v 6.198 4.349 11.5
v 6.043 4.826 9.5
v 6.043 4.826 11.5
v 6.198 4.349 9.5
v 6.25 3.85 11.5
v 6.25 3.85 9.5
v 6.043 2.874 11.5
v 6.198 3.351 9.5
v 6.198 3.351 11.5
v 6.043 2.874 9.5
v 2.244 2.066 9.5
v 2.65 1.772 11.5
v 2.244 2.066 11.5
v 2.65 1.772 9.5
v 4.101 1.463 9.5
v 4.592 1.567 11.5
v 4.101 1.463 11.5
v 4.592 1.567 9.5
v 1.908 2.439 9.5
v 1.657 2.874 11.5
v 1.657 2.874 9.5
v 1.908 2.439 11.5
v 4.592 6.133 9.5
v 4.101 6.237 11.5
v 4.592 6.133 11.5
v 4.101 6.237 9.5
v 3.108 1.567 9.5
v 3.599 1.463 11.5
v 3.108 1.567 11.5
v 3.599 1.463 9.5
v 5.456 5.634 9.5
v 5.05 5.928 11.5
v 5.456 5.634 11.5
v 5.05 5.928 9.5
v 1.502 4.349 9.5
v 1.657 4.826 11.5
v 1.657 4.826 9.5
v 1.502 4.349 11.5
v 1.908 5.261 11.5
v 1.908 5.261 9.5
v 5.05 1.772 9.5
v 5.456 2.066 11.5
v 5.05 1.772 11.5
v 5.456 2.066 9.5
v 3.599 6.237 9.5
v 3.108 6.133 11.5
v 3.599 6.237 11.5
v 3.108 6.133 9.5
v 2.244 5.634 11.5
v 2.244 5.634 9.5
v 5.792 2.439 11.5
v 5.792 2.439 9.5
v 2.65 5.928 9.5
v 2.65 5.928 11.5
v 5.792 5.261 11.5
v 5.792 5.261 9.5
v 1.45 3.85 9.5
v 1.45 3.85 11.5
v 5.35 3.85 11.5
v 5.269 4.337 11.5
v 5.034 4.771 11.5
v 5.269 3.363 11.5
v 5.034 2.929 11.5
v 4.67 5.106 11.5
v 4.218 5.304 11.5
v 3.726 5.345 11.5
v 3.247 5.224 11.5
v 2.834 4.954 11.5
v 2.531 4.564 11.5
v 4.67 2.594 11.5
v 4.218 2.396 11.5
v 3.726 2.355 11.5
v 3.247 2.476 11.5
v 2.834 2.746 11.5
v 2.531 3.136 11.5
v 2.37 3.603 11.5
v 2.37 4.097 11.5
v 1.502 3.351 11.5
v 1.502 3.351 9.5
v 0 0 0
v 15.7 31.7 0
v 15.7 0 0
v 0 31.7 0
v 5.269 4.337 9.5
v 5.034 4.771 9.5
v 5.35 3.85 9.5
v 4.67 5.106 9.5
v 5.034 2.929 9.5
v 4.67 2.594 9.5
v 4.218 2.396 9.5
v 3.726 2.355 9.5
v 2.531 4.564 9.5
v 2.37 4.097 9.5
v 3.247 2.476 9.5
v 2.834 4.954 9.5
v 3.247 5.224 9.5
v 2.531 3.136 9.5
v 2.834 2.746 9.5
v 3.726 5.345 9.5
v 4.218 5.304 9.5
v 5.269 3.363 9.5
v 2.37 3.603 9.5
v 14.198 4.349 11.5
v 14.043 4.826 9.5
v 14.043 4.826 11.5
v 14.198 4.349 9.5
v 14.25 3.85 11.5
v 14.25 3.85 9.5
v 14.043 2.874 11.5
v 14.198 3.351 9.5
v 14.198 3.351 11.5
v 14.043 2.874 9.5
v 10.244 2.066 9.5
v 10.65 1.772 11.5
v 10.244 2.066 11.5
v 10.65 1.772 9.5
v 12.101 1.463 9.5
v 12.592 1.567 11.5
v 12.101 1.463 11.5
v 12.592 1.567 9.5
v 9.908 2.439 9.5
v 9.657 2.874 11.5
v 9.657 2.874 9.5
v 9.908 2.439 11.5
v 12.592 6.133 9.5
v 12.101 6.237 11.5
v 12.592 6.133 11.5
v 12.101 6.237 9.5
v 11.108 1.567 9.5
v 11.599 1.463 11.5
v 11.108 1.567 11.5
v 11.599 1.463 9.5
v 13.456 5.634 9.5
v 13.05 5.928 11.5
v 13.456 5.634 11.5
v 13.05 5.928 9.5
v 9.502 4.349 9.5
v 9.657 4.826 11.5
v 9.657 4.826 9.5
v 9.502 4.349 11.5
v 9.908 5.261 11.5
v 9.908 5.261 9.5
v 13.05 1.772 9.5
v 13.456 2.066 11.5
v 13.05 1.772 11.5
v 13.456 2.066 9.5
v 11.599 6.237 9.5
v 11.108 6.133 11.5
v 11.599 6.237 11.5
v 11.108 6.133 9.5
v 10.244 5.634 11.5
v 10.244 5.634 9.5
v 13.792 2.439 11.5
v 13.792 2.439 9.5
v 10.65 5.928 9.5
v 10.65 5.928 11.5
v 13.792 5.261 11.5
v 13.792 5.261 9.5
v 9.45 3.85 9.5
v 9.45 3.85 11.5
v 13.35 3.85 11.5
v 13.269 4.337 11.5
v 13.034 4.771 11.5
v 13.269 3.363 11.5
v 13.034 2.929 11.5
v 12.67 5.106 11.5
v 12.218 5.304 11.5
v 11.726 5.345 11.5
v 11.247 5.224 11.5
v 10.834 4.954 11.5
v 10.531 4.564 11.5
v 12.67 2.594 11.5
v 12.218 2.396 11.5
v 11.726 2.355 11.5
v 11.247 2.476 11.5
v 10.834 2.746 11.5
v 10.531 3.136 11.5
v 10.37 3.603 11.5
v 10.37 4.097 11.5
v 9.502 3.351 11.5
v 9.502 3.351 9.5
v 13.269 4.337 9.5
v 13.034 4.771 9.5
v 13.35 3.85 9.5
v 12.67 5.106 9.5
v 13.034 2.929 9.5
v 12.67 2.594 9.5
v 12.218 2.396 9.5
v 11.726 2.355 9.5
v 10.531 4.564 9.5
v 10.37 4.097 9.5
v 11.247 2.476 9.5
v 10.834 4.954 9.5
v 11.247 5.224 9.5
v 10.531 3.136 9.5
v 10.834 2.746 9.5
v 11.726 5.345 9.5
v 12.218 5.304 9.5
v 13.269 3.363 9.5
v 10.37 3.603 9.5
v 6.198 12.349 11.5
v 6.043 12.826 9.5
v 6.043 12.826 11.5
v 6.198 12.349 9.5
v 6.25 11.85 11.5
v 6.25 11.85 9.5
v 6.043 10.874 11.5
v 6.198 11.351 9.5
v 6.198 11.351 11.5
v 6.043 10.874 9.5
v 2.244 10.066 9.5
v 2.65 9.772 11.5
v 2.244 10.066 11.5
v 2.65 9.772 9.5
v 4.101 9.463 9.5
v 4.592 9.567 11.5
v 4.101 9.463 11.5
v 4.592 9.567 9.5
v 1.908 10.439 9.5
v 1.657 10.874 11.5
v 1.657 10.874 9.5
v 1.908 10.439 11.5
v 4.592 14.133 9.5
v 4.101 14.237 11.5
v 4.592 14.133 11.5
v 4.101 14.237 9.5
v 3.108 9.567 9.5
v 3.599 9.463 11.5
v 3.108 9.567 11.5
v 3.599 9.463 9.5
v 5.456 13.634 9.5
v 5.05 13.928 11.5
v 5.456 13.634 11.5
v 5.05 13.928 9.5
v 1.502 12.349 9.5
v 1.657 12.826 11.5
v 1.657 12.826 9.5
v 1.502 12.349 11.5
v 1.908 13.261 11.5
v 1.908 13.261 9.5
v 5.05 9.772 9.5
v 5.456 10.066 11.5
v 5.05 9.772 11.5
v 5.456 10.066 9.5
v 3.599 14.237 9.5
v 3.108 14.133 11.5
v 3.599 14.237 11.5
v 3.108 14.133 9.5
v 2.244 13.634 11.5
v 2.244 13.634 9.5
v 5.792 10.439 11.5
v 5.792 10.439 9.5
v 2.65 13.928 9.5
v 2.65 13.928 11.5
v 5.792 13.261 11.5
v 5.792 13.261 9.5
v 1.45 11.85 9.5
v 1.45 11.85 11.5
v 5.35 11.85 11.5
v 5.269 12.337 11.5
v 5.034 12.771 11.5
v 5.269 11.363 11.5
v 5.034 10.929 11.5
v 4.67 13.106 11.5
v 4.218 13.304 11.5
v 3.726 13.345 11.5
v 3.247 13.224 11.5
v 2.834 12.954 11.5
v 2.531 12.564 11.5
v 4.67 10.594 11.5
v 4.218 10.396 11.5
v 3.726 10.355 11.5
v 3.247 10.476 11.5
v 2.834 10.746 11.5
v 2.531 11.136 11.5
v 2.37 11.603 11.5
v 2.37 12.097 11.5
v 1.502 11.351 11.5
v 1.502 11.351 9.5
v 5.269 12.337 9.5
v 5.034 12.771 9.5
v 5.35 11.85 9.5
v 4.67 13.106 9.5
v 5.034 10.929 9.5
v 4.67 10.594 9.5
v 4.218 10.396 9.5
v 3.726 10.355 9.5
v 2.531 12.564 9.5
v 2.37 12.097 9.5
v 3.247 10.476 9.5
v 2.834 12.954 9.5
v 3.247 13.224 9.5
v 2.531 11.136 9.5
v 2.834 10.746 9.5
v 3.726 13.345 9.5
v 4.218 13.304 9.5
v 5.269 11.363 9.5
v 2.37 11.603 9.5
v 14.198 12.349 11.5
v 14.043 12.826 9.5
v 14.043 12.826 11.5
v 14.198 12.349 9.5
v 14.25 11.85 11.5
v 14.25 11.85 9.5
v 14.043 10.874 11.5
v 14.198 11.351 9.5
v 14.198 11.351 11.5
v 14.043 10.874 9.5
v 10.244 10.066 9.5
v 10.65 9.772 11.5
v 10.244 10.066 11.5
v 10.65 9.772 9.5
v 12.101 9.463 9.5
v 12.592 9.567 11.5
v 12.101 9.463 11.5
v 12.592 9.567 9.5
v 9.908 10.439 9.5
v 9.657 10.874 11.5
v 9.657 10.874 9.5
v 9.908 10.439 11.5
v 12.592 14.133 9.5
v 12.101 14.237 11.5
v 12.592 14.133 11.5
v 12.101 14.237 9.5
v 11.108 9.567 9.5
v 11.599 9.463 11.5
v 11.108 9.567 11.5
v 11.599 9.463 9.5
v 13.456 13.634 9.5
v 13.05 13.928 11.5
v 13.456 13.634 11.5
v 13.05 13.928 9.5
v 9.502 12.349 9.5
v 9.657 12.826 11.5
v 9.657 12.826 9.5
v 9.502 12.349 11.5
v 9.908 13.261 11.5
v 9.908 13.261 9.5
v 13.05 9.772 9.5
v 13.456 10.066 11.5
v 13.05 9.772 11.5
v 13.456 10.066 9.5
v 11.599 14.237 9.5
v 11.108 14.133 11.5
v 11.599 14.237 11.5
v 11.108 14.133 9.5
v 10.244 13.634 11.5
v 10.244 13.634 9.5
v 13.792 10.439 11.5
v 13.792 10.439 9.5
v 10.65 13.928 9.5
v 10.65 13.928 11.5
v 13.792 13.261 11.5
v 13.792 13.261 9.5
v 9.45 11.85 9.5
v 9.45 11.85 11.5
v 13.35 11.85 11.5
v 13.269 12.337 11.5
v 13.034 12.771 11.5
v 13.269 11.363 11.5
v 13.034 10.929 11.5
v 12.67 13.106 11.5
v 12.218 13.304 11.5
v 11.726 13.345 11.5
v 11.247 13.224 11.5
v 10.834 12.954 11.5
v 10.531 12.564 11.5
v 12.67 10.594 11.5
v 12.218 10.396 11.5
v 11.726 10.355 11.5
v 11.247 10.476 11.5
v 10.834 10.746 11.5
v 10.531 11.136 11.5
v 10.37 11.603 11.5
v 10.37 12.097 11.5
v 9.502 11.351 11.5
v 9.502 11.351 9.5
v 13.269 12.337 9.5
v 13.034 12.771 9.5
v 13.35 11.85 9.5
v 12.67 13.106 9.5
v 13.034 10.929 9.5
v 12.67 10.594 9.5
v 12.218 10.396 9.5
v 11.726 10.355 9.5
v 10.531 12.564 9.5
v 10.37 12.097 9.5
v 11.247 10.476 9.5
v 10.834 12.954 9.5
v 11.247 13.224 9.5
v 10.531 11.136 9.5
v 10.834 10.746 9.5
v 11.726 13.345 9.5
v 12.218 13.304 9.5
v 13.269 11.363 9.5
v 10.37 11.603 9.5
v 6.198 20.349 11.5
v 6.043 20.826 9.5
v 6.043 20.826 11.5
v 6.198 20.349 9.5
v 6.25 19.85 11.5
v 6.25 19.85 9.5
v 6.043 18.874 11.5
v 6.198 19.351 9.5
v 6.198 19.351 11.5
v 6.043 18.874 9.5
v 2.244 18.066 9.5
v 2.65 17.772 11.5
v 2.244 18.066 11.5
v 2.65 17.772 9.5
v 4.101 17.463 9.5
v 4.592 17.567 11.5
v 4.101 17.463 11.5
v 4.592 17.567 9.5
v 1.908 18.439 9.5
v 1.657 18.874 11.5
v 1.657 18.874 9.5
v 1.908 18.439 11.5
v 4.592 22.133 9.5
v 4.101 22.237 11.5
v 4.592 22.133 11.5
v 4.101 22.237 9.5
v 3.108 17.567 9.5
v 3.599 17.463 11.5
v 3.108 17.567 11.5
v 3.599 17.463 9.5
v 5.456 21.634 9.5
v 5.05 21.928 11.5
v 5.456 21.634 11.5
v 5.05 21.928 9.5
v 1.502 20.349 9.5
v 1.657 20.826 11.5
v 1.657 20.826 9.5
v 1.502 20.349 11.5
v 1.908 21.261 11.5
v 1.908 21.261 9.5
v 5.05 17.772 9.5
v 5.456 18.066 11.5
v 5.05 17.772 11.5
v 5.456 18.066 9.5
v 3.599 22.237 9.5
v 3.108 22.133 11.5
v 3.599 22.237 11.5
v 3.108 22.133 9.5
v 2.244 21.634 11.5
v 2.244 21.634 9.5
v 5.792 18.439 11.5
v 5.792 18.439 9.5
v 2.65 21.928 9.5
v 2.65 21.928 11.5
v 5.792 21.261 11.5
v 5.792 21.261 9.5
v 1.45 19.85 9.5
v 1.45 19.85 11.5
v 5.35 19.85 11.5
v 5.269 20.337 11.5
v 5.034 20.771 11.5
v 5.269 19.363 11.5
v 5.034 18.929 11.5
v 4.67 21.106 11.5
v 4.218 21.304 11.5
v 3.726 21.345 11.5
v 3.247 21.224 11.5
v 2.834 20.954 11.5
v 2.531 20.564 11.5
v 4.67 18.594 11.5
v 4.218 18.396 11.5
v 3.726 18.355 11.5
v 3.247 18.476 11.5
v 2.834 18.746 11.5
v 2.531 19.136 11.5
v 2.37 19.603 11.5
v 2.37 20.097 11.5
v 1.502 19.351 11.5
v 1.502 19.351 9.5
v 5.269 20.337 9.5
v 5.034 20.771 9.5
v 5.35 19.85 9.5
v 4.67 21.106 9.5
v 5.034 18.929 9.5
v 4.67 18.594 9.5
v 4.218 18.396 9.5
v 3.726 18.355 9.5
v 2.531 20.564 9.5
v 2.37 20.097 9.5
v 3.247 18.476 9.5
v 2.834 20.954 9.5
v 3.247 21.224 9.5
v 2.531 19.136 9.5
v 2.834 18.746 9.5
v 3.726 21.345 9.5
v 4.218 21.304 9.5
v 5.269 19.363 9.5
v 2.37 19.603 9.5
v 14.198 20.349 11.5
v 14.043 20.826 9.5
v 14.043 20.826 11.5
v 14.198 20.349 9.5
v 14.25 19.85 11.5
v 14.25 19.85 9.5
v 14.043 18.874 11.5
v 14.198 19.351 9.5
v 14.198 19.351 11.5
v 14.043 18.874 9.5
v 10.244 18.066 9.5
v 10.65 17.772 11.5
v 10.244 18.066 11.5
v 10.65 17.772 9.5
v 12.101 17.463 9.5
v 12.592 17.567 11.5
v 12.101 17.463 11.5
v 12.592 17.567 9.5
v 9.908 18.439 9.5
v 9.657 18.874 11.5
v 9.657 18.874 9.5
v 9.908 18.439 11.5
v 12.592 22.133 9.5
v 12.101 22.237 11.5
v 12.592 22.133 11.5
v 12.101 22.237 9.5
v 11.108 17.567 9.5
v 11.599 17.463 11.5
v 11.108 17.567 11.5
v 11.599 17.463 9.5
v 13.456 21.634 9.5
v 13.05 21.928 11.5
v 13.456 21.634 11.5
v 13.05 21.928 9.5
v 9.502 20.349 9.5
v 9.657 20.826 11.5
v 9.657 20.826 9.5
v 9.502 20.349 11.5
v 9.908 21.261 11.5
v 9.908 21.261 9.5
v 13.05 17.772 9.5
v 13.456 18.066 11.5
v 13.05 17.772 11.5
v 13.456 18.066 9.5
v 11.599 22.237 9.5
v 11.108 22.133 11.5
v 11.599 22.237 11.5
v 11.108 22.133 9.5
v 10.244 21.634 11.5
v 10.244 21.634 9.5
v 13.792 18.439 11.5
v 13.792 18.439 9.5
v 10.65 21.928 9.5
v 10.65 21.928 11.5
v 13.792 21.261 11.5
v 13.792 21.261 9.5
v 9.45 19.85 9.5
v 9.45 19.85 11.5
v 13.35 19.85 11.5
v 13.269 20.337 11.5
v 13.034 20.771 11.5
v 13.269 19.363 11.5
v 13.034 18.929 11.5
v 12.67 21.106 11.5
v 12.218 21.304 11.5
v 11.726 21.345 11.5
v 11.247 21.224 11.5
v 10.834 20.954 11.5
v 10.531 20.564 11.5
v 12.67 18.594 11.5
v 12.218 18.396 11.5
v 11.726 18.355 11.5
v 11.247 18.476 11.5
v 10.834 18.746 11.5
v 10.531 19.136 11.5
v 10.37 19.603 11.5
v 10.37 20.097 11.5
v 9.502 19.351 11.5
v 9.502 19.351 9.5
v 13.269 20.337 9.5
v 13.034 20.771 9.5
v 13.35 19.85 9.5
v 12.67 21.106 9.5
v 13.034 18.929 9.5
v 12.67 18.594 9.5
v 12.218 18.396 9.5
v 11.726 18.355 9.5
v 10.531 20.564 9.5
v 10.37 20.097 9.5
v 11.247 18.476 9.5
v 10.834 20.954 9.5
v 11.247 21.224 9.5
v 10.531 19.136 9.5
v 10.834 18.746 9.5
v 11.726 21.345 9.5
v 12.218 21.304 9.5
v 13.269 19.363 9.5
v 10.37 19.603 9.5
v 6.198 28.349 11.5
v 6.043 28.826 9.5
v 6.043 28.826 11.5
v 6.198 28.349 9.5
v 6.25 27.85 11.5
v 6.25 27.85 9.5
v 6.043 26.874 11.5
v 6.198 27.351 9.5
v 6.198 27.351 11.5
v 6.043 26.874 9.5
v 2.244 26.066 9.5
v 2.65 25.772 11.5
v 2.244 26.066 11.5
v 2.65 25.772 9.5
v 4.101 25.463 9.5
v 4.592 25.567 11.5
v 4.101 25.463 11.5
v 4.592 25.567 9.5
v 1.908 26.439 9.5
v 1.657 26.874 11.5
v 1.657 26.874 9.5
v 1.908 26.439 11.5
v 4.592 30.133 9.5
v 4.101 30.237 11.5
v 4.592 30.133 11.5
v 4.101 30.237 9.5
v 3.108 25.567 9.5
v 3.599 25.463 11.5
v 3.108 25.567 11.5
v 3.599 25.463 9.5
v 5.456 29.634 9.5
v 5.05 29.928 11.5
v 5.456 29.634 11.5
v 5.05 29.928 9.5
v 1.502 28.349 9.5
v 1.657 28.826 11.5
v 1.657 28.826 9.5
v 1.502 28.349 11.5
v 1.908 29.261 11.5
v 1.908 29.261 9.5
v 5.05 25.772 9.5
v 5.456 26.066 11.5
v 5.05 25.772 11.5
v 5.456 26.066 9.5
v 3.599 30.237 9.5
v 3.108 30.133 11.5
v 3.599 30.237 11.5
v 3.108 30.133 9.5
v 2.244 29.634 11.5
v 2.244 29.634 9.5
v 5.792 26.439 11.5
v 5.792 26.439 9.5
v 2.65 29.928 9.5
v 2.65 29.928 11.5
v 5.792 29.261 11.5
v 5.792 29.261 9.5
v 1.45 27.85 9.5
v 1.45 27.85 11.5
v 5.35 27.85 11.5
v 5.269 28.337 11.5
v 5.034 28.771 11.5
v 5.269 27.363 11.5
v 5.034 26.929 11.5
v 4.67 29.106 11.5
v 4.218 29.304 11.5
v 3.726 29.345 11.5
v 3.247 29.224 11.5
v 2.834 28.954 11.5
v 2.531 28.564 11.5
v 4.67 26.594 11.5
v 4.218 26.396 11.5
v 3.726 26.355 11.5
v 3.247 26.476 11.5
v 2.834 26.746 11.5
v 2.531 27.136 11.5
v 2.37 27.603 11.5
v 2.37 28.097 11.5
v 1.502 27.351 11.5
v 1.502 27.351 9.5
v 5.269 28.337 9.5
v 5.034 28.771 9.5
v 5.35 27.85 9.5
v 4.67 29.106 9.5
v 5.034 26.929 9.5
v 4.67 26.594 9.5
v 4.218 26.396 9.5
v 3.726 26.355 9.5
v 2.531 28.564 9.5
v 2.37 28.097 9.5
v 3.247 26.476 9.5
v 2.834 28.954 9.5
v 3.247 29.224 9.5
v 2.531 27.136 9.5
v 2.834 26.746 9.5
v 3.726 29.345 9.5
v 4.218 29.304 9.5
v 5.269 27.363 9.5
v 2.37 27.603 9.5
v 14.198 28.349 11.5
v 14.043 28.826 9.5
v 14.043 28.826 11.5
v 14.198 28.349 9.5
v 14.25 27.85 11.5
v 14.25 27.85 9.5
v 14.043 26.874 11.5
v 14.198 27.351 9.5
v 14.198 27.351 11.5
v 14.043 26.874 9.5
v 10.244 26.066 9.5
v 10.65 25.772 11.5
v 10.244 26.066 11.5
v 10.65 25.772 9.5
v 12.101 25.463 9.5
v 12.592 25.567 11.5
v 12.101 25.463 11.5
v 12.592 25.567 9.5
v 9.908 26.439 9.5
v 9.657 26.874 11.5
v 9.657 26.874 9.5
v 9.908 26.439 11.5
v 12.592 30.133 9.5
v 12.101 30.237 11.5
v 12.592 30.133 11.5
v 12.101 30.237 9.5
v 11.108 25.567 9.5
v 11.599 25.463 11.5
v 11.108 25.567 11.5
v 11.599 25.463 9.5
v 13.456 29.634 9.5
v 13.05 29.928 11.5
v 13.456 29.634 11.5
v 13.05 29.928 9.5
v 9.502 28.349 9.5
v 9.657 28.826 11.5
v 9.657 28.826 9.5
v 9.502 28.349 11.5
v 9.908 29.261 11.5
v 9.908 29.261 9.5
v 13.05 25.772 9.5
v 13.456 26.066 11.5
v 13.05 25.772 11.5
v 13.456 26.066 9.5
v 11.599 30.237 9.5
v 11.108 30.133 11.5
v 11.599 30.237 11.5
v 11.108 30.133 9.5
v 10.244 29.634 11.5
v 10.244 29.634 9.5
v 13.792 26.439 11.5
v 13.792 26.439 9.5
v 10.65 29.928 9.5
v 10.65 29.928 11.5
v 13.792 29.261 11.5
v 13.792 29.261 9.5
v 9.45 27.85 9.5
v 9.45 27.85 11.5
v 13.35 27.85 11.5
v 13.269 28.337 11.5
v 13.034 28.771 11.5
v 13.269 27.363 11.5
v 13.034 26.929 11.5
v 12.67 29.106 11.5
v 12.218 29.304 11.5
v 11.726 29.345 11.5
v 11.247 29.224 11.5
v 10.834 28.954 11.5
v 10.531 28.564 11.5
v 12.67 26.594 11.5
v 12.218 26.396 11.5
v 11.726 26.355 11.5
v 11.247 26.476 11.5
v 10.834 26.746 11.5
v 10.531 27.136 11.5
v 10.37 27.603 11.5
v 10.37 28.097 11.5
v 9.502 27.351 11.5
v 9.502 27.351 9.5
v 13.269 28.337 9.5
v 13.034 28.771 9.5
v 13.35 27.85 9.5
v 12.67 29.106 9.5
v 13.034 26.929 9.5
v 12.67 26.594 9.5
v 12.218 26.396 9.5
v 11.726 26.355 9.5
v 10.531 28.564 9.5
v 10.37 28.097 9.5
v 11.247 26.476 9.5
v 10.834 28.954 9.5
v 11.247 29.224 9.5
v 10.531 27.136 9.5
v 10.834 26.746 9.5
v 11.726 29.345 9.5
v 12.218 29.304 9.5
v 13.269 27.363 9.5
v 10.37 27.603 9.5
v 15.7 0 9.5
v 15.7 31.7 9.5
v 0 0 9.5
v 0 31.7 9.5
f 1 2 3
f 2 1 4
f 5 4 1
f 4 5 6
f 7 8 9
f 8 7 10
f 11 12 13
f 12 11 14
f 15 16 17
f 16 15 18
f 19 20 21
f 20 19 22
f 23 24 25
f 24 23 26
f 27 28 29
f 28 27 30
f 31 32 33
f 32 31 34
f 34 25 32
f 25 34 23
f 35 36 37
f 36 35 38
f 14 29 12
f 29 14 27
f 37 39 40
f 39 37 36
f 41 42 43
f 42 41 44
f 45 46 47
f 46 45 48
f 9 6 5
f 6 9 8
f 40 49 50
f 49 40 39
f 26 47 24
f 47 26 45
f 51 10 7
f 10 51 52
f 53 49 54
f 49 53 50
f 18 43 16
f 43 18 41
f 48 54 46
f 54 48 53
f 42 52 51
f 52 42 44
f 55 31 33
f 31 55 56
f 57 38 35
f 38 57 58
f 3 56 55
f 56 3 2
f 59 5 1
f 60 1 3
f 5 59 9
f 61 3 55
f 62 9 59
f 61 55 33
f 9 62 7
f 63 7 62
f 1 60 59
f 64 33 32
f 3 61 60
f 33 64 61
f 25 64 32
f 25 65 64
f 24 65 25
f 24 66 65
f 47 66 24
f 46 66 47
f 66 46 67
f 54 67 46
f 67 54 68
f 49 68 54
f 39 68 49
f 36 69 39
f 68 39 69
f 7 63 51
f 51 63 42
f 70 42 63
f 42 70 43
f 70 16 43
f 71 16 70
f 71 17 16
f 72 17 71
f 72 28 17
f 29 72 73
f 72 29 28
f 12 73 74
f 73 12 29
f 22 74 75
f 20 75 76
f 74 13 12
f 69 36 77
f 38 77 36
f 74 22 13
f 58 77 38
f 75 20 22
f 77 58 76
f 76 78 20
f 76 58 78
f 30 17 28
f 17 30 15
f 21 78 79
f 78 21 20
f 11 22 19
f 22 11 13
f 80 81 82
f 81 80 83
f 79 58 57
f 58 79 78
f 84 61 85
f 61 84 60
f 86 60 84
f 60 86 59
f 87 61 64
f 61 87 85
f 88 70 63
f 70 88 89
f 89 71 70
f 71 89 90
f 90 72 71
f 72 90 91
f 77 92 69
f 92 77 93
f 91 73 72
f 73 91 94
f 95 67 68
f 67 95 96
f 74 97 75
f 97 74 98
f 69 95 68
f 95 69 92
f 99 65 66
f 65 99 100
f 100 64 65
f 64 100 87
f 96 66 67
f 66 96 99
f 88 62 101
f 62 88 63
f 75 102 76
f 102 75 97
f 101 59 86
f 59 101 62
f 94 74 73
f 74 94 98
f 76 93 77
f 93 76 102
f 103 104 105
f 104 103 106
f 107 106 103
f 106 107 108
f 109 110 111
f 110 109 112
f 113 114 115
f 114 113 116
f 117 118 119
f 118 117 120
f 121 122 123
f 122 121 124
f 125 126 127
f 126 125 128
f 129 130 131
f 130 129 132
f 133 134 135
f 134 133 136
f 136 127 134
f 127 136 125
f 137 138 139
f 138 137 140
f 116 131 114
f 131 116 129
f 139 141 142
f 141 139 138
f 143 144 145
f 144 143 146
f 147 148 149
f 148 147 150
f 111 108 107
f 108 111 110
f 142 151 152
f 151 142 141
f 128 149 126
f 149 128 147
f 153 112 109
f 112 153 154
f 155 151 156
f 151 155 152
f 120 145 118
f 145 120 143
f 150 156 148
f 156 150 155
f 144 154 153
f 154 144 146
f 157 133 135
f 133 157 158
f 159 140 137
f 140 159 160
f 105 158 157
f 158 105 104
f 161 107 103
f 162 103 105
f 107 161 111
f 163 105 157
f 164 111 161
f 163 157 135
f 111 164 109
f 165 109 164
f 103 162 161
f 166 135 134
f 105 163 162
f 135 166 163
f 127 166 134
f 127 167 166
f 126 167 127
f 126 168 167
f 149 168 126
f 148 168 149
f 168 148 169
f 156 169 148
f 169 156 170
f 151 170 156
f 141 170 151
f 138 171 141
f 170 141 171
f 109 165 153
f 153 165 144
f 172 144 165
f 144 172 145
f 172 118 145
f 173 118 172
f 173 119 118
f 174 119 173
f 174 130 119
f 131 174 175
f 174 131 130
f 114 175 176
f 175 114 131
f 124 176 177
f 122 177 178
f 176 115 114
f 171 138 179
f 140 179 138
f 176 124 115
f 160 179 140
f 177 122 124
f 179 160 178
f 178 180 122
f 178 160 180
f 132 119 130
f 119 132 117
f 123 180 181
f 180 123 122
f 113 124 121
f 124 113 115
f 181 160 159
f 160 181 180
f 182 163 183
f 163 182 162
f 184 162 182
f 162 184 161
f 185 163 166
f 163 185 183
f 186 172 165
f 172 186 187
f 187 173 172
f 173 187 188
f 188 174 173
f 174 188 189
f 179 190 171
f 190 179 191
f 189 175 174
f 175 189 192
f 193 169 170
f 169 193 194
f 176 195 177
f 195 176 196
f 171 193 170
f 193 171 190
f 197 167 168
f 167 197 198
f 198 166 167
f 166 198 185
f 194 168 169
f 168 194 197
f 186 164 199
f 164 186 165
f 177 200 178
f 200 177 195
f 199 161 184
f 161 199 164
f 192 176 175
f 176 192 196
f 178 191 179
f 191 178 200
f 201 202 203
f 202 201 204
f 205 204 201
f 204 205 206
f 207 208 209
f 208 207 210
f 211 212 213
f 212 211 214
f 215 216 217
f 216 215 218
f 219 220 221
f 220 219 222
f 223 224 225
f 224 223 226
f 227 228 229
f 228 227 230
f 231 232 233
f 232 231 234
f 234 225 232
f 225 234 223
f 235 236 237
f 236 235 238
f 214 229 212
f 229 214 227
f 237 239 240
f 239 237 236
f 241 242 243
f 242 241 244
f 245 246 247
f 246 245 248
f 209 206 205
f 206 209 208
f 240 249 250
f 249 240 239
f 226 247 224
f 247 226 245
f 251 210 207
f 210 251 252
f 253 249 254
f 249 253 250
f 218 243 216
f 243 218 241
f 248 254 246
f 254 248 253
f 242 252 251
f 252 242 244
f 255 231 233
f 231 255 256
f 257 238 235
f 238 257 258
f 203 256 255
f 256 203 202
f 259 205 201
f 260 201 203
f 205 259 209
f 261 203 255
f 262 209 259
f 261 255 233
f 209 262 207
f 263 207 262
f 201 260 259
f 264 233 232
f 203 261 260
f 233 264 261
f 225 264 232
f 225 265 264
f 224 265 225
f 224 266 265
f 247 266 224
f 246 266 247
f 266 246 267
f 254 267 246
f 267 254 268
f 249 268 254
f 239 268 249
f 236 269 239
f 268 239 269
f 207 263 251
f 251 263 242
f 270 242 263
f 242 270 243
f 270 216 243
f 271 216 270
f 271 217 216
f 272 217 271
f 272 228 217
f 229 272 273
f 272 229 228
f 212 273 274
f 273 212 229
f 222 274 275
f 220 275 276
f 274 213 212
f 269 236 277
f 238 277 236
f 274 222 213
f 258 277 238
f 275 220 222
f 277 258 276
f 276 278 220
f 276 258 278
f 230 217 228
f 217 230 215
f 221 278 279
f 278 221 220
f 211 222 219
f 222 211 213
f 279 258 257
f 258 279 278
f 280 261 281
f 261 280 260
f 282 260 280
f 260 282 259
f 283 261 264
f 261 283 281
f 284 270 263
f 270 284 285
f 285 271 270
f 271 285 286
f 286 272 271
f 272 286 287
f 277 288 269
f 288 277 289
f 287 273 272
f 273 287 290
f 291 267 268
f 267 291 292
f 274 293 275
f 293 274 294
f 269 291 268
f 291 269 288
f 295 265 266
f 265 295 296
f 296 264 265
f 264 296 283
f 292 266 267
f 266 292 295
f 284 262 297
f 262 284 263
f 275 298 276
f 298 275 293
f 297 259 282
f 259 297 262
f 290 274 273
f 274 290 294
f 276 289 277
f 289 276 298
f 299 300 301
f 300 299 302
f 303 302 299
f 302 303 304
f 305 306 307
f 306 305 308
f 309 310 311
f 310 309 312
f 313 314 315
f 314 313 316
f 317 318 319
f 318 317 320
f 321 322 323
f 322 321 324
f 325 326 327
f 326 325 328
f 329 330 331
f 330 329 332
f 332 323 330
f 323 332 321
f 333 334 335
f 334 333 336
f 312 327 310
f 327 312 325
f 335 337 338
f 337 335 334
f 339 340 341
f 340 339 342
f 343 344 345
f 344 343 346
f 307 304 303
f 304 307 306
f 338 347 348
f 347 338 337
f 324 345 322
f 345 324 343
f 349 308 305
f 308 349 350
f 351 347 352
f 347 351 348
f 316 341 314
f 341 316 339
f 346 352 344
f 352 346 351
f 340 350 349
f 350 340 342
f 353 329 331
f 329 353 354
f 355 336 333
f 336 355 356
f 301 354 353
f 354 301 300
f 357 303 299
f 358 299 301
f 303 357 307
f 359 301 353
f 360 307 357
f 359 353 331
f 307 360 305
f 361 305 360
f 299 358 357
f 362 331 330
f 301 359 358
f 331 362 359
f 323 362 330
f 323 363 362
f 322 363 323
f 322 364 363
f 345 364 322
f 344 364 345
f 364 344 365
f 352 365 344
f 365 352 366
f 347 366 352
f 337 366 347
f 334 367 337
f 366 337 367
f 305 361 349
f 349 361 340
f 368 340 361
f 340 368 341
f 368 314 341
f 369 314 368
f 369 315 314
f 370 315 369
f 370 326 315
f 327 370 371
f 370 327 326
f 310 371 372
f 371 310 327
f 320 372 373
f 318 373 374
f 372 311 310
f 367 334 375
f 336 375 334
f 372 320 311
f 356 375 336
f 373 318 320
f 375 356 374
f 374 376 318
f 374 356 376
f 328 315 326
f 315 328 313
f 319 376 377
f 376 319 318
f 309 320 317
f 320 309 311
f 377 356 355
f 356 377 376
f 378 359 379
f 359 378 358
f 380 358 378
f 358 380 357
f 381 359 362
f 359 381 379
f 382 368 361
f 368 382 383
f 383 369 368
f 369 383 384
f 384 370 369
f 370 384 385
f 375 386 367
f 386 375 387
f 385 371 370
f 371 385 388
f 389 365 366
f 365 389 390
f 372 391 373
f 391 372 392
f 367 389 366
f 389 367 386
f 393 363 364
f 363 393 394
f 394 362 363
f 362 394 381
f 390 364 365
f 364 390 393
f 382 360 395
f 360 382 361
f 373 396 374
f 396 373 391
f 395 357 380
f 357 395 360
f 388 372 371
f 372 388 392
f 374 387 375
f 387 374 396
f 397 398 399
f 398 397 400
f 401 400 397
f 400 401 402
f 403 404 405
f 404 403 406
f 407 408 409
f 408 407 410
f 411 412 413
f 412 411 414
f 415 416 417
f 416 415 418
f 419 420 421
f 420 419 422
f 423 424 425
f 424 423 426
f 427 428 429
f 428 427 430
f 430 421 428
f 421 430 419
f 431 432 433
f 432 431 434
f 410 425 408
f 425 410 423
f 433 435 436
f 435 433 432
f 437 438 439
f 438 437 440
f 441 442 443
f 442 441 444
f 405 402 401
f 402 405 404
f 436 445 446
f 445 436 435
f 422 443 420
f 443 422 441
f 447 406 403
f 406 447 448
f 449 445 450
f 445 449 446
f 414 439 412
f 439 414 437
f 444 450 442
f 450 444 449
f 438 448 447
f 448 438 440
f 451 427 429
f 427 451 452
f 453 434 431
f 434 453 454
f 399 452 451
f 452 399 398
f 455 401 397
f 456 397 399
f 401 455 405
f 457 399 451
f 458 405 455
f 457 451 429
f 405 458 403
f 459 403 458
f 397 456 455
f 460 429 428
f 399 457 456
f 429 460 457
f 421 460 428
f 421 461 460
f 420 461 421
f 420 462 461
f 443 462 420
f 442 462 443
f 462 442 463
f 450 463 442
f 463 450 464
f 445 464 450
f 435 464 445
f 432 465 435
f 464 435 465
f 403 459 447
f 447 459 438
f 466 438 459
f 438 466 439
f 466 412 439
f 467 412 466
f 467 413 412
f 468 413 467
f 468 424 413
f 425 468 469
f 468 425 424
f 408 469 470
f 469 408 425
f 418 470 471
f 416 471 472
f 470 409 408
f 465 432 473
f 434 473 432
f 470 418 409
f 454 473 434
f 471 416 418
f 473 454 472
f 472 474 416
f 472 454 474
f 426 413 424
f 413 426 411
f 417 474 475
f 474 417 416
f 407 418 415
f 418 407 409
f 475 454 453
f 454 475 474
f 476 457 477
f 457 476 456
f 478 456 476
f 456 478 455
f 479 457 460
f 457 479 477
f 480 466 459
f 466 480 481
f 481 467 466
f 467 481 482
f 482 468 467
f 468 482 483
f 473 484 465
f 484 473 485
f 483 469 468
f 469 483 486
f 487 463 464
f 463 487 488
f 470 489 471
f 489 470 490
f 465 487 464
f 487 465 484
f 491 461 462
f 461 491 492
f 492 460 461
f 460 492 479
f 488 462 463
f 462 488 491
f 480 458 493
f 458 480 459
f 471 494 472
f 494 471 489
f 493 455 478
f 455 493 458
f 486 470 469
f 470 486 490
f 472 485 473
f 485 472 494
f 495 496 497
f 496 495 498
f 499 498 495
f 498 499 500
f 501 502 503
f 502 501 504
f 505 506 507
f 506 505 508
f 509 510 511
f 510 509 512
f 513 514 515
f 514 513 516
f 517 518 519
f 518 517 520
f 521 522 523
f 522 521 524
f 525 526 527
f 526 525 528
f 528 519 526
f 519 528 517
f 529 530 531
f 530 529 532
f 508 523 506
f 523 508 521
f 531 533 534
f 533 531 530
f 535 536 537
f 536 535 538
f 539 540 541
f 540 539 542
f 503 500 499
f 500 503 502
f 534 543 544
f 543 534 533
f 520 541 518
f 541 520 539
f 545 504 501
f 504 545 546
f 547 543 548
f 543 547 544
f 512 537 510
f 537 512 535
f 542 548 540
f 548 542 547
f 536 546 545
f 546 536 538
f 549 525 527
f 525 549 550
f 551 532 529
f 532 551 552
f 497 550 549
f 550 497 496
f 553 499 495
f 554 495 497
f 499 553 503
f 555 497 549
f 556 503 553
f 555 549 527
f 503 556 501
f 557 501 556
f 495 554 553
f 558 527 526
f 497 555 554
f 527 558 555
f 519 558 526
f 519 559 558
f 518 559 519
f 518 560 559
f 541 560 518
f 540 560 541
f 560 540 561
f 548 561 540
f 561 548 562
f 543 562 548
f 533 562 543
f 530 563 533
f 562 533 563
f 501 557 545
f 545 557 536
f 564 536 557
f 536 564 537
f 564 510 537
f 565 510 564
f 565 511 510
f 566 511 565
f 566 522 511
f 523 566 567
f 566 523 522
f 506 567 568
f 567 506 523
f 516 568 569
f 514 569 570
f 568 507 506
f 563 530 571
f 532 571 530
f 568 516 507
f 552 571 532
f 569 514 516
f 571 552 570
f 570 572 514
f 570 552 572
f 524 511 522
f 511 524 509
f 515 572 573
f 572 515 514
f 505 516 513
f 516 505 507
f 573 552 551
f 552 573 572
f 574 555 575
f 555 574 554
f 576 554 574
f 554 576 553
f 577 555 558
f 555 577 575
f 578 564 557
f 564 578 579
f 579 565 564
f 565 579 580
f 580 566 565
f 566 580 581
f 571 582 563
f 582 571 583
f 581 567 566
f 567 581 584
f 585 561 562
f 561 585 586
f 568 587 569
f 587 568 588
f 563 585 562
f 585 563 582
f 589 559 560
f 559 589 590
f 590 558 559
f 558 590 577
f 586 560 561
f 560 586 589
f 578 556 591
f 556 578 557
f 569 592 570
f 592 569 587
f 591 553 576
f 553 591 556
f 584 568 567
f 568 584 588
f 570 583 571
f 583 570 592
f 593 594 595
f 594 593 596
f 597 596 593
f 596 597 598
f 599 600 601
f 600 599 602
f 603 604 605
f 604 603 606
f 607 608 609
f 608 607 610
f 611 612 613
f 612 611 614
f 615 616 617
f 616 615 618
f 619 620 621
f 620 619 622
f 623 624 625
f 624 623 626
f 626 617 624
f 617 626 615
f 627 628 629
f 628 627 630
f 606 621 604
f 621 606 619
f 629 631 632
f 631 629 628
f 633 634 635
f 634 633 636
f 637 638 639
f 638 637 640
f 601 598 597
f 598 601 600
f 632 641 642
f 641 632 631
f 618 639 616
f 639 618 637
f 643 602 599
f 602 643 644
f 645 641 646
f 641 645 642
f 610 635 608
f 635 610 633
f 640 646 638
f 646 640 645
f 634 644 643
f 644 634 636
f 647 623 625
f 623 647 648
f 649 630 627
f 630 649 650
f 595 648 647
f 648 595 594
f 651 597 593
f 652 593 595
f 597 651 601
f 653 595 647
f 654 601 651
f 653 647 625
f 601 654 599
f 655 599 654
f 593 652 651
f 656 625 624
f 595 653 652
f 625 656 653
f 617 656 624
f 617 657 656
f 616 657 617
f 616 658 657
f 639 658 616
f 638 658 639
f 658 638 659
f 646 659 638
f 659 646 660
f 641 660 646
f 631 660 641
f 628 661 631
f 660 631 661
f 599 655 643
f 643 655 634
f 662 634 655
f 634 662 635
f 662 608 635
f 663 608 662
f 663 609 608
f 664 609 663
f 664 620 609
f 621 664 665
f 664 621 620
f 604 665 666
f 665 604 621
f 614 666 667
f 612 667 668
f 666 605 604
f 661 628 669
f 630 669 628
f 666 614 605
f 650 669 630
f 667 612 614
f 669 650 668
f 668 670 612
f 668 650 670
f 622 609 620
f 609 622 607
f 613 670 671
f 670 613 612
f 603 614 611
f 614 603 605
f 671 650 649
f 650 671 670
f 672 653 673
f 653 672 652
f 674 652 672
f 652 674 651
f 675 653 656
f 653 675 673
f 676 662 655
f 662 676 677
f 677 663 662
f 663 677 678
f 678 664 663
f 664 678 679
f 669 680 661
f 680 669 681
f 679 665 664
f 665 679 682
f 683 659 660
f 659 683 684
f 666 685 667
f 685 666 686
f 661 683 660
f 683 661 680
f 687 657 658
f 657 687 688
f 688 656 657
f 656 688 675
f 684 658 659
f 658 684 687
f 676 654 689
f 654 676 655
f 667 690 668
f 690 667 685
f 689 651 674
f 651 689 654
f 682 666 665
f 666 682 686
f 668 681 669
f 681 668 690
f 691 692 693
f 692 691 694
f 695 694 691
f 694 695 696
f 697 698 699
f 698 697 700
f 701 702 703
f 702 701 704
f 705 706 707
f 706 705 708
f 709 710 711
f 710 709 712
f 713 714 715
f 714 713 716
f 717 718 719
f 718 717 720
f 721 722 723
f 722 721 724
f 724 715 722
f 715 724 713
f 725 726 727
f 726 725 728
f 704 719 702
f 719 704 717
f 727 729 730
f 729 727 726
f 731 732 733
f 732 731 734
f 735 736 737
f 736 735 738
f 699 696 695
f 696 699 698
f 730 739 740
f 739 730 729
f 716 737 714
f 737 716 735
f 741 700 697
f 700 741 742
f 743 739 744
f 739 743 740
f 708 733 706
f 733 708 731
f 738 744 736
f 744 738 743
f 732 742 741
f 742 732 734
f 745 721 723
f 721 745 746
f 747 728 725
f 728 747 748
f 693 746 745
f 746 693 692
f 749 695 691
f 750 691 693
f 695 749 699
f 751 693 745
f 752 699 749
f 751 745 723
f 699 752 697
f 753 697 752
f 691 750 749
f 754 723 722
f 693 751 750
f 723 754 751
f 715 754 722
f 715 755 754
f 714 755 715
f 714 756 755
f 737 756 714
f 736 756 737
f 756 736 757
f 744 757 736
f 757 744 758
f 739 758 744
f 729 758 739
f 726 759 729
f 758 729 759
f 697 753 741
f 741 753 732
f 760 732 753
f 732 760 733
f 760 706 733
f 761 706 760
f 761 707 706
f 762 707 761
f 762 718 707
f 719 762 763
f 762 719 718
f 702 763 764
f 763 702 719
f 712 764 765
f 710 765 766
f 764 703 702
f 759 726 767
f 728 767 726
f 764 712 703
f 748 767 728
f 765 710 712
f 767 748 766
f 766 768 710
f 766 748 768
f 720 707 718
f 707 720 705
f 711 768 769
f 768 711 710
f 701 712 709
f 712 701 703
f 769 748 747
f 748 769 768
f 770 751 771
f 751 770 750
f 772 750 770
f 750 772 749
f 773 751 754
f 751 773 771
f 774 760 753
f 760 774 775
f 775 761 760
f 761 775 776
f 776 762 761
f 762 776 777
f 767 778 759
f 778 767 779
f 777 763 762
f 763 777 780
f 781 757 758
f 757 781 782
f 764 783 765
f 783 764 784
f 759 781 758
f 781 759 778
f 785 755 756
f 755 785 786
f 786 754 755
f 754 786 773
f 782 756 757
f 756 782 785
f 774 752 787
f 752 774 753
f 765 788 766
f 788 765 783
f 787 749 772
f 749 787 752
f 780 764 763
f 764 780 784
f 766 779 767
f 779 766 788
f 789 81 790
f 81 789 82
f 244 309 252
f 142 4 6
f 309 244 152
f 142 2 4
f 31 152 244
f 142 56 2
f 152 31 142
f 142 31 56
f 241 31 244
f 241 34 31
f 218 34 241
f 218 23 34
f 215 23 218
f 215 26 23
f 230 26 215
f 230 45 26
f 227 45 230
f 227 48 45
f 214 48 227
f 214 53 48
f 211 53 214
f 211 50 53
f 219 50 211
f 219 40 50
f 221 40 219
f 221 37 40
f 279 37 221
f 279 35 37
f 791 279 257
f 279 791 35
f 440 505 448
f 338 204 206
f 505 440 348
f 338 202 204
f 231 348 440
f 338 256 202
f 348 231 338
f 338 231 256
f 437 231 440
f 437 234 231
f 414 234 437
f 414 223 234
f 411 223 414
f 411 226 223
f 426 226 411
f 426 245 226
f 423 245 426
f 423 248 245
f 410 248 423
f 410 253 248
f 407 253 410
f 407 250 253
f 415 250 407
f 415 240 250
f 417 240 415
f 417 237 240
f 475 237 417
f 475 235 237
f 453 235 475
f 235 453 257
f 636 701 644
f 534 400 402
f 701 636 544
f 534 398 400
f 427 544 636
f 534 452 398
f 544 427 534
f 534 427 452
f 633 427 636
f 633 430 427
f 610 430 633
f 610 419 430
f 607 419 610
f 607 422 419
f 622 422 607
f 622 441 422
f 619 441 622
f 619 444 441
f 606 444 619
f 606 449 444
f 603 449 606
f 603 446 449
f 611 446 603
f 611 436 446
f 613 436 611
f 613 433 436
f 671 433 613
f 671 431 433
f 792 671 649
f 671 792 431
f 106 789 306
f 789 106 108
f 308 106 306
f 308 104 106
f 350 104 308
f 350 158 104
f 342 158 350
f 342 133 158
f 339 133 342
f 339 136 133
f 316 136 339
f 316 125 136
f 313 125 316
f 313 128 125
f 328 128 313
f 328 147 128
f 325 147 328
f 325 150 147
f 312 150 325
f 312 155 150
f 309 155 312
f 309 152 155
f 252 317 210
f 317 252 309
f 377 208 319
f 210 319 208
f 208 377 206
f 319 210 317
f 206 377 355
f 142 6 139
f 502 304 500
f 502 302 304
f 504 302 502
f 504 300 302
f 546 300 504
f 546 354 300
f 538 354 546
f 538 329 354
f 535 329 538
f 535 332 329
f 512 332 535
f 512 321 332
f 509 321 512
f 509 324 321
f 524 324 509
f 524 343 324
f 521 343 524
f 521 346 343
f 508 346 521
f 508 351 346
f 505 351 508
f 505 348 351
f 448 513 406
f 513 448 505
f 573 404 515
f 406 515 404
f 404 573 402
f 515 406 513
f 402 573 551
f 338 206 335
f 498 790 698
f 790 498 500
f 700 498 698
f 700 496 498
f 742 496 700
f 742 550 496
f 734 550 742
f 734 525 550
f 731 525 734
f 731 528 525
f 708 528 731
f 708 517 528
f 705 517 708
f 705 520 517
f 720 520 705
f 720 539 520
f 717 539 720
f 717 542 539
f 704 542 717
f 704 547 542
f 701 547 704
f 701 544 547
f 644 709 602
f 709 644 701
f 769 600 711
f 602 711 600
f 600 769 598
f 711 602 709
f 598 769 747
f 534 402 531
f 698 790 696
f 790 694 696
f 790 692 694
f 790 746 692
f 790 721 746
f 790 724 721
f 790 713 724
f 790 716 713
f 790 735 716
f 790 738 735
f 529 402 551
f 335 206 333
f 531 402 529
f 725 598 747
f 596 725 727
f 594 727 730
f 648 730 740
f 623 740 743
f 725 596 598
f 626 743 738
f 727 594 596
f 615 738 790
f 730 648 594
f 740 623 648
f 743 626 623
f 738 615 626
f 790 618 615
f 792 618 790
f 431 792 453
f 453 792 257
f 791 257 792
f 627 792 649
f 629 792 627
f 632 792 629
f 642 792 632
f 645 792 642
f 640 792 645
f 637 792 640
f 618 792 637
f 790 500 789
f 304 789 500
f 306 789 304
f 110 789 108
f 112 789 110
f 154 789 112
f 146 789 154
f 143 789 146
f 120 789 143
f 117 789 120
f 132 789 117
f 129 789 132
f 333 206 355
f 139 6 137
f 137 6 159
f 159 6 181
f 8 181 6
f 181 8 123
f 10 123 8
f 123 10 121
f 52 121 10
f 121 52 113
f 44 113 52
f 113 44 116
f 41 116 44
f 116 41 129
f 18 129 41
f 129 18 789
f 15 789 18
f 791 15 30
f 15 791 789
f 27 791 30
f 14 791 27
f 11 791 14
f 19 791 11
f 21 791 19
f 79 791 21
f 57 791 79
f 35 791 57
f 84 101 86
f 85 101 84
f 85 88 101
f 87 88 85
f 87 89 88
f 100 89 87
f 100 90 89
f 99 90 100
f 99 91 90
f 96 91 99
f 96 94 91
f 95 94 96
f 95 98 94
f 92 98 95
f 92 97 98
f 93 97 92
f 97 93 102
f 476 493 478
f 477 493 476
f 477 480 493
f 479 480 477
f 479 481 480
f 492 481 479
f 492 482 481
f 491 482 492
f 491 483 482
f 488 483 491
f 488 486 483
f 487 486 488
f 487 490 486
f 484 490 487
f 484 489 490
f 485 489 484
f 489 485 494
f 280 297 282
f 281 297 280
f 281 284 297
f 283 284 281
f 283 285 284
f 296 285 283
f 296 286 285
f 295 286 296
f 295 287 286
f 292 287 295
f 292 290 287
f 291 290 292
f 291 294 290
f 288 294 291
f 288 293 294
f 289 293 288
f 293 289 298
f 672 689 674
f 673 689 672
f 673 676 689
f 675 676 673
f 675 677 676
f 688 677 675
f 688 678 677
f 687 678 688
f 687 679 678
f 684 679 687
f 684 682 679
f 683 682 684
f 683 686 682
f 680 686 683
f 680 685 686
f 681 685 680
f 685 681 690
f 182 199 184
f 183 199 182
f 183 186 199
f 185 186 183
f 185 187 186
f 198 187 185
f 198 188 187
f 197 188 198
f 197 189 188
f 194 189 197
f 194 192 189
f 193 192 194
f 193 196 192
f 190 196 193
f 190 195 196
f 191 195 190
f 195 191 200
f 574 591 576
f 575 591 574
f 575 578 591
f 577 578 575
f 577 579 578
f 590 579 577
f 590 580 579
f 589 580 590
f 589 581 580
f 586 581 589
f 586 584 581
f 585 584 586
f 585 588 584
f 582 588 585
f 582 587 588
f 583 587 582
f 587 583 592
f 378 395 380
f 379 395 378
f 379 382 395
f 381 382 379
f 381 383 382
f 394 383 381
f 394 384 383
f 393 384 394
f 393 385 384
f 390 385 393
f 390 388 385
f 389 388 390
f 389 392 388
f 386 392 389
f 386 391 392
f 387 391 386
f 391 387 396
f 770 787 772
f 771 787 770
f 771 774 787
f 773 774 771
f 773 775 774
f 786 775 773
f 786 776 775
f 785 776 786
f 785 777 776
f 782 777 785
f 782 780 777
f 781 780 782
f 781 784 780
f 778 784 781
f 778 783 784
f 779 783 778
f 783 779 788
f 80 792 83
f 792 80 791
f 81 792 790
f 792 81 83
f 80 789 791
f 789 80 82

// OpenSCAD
include <MCAD/lego_compatibility.scad>

block(4,2,1,reinforcement=false,hollow_knob=true);
